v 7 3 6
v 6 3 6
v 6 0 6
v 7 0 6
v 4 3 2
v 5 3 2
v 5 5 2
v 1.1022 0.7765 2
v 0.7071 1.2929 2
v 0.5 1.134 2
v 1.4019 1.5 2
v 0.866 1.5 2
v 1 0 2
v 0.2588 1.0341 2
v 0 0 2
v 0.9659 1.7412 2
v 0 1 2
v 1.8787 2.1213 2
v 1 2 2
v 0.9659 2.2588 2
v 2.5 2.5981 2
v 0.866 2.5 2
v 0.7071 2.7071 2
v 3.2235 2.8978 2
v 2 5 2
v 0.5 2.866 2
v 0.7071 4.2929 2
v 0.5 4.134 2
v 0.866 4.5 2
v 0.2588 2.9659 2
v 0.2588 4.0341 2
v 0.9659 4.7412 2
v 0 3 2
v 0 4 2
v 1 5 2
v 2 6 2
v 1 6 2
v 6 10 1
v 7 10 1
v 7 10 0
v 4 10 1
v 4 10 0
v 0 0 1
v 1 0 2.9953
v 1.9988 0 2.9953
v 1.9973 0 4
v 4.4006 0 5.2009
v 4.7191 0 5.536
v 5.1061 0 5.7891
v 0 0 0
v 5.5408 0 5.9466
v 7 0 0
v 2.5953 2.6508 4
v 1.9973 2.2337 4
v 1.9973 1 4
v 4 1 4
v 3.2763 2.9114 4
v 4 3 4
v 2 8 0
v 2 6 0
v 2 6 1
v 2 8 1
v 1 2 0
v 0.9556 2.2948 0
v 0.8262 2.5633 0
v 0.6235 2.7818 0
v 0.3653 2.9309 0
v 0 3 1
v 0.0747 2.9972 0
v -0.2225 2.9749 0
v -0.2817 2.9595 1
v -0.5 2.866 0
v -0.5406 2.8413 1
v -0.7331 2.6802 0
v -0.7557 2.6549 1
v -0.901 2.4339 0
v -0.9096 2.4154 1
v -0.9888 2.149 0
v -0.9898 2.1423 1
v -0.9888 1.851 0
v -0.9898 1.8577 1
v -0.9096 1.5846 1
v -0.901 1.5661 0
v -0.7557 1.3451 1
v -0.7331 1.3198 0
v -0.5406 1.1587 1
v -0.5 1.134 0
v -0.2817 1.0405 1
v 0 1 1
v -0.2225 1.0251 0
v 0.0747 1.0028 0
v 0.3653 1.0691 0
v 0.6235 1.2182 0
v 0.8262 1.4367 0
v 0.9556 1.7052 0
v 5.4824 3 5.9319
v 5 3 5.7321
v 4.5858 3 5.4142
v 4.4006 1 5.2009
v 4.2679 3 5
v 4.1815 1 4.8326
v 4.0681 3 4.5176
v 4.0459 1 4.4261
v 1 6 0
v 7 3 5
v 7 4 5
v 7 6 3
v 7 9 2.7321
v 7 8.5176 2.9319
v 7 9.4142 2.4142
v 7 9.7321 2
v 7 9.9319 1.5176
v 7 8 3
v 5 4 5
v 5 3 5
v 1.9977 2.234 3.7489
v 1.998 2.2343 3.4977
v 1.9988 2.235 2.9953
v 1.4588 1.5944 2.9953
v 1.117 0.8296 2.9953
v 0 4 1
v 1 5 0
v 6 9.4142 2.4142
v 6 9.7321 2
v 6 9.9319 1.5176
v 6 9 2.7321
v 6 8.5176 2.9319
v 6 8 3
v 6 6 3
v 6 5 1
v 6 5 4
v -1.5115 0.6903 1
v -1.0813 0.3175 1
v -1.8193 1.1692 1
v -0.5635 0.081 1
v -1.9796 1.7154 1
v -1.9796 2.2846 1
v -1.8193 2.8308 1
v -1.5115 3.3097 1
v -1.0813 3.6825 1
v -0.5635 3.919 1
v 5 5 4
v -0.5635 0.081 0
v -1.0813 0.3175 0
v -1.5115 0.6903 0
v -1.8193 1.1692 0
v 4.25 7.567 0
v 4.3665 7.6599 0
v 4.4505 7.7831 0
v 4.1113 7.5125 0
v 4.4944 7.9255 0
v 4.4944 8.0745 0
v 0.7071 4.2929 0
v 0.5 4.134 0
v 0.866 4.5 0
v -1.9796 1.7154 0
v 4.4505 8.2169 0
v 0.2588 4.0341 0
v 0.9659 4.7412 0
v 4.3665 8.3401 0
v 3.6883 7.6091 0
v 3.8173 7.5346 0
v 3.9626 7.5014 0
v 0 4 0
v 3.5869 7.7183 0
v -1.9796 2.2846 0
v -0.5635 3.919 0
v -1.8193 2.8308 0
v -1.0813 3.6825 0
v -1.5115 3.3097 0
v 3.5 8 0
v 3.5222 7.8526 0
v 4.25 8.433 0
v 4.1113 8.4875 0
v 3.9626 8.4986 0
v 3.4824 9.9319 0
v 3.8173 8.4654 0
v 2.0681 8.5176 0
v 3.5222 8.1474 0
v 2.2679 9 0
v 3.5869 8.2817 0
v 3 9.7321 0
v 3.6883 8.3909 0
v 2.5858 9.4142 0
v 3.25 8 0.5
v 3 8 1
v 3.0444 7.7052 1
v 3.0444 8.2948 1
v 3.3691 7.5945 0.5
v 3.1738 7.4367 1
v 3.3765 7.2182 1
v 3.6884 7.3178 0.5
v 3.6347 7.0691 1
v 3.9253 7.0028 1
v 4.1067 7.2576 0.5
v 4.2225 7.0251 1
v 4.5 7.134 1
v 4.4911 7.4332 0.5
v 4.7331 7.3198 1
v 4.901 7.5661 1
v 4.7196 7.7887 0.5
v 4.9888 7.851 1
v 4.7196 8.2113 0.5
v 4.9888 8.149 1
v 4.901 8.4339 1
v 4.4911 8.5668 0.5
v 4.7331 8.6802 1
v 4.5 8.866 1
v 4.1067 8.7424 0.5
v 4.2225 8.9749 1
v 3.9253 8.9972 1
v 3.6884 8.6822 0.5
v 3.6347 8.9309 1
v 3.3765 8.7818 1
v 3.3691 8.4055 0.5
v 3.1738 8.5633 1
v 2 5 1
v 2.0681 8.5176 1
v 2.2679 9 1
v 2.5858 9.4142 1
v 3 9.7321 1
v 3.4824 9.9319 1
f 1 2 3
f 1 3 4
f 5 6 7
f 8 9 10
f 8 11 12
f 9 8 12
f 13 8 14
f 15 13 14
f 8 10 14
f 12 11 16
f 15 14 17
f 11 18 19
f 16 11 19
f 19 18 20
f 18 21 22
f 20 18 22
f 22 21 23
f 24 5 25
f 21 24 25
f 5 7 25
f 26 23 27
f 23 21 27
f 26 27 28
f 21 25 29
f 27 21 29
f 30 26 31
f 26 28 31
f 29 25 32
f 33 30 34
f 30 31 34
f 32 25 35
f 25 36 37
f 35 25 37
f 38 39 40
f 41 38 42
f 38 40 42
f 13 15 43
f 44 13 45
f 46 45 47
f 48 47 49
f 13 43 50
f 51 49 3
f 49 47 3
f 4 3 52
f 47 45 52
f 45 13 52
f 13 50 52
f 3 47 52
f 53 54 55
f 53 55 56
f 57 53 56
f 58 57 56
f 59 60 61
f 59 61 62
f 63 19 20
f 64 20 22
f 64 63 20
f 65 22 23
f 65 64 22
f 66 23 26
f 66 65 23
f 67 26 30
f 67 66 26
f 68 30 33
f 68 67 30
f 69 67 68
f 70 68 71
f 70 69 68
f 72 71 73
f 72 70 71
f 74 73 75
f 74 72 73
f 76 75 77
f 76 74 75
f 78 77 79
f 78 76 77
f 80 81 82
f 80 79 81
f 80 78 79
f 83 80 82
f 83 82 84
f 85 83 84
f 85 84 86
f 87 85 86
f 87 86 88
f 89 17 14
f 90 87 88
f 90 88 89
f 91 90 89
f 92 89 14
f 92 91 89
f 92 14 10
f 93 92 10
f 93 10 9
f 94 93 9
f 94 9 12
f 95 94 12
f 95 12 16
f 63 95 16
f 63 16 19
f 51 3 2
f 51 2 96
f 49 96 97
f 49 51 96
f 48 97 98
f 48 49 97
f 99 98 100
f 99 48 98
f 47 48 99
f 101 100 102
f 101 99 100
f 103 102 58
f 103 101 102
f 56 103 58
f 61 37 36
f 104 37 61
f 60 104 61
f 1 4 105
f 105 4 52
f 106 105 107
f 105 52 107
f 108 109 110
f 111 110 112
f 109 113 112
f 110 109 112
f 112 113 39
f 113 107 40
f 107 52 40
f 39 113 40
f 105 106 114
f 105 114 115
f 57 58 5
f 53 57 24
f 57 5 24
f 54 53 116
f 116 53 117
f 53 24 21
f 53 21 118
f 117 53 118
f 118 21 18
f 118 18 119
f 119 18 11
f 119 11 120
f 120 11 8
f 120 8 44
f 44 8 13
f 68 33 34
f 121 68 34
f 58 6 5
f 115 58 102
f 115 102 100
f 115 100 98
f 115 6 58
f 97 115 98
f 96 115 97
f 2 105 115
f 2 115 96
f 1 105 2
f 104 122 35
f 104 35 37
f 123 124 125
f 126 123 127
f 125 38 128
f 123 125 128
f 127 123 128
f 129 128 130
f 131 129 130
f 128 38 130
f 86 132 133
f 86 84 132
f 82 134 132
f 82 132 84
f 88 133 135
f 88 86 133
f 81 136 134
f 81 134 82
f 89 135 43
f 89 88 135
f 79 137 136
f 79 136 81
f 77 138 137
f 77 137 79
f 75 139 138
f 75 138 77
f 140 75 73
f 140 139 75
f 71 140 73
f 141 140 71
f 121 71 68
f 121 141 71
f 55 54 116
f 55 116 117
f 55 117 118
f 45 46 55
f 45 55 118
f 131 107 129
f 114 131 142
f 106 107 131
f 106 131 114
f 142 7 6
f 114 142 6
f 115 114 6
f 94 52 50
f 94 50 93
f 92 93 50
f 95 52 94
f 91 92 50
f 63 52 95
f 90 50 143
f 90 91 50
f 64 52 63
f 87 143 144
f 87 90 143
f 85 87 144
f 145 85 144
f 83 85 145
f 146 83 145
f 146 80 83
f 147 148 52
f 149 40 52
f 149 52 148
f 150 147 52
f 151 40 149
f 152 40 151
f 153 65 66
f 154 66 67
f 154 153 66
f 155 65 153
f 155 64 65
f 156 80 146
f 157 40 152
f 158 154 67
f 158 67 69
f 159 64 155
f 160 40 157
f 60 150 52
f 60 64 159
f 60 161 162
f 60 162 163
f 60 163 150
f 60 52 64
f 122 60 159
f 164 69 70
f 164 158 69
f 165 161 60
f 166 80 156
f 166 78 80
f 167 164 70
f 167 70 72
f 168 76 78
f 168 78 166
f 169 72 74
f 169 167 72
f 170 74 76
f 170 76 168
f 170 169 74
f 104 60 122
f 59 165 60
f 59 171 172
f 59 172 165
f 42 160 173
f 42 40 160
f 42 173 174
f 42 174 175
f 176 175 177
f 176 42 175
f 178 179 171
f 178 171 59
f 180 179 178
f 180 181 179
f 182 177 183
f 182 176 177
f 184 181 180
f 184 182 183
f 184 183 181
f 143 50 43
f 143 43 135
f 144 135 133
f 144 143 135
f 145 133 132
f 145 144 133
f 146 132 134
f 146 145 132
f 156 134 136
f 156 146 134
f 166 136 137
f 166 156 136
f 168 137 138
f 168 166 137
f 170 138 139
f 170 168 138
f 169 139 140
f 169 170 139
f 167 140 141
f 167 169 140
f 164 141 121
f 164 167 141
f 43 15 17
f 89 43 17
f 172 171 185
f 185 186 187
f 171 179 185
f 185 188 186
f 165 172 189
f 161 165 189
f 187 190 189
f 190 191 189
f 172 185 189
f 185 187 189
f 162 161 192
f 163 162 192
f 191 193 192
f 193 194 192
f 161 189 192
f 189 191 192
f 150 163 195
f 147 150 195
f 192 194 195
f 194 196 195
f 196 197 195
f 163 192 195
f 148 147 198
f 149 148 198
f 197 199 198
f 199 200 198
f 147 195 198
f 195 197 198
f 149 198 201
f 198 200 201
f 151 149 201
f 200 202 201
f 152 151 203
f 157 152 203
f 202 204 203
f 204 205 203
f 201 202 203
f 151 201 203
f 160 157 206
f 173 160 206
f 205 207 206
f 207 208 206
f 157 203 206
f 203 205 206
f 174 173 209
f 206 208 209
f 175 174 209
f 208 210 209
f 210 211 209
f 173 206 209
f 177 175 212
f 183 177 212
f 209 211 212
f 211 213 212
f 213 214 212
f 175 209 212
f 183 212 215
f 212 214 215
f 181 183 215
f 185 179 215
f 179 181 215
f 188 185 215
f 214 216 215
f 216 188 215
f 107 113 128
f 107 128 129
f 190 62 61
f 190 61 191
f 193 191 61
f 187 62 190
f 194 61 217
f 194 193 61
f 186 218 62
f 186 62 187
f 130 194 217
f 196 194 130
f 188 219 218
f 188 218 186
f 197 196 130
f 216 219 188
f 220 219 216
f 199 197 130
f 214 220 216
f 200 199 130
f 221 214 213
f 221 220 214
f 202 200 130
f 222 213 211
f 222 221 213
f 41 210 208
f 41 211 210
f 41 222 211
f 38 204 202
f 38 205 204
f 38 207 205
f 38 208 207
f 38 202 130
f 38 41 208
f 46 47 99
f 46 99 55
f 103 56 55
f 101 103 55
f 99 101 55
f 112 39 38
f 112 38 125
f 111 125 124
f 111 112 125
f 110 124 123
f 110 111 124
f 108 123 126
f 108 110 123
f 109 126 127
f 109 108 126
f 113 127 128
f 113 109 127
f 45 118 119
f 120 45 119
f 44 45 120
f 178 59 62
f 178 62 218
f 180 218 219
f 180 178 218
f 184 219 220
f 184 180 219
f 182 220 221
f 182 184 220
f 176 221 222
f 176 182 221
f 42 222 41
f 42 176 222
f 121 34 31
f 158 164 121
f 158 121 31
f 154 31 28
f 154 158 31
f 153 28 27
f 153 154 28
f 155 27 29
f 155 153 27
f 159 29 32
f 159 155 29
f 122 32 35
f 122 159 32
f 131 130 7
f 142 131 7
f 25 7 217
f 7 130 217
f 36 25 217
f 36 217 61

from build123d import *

# Parameters (mm, degrees)
SKETCH1_R           = 1
BOSS_EXTRUDE1_DEPTH = 2
SKETCH2_W           = 4
SKETCH2_H           = 5
SKETCH2_W_2         = 2.463434366
SKETCH2_H_2         = 4
CUT_EXTRUDE1_DEPTH  = 1
BOSS_EXTRUDE2_DEPTH = 4
CUT_EXTRUDE2_DEPTH  = 4
CUT_EXTRUDE3_DEPTH  = 2
CUT_EXTRUDE4_START  = -3
CUT_EXTRUDE4_DEPTH  = 2.234970342


with BuildPart() as part:
    # Sketch1 → Boss-Extrude1 (new body)
    with BuildSketch(Plane.XY):
        with BuildLine():
            Line((1, 5), (1, 6))
            Line((1, 6), (2, 6))
            Line((2, 6), (2, 8))
            ThreePointArc((2, 8), (2.585786438, 9.414213562), (4, 10))
            Line((4, 10), (7, 10))
            Line((7, 10), (7, 0))
            Line((7, 0), (0, 0))
            ThreePointArc((0, 0), (-2, 2), (0, 4))
            ThreePointArc((0, 4), (0.707106781, 4.292893219), (1, 5))
        make_face()
        with Locations((0, 2)):
            Circle(SKETCH1_R, mode=Mode.SUBTRACT)
    extrude(amount=BOSS_EXTRUDE1_DEPTH)

    # Sketch2 → Cut-Extrude1 (cut)
    with BuildSketch(Plane.XY.offset(2)):
        with Locations((4, 7.5)):
            Rectangle(SKETCH2_W, SKETCH2_H)
        with Locations((-1.231717183, 2)):
            Rectangle(SKETCH2_W_2, SKETCH2_H_2)
    extrude(amount=-CUT_EXTRUDE1_DEPTH, mode=Mode.SUBTRACT)

    # Sketch3 → Boss-Extrude2 (add)
    with BuildSketch(Plane.XY.offset(2)):
        with BuildLine():
            Line((7, 10), (6, 10))
            Line((6, 10), (6, 5))
            Line((6, 5), (5, 5))
            Line((5, 5), (5, 3))
            Line((5, 3), (4, 3))
            ThreePointArc((4, 3), (1.878679656, 2.121320344), (1, 0))
            Line((1, 0), (7, 0))
            Line((7, 0), (7, 10))
        make_face()
    extrude(amount=BOSS_EXTRUDE2_DEPTH)

    # Sketch4 → Cut-Extrude2 (cut)
    with BuildSketch(Plane(origin=(7, 0, 0), x_dir=(0, 0, -1), z_dir=(1, 0, 0))):
        with BuildLine():
            Line((-3, 8), (-3, 6))
            Line((-3, 6), (-5, 4))
            Line((-5, 4), (-5, 3))
            Line((-5, 3), (-6, 3))
            Line((-6, 3), (-6, 10))
            Line((-6, 10), (-1, 10))
            ThreePointArc((-1, 10), (-2.414213562, 9.414213562), (-3, 8))
        make_face()
    extrude(amount=-CUT_EXTRUDE2_DEPTH, mode=Mode.SUBTRACT)

    # Sketch5 → Cut-Extrude3 (cut)
    with BuildSketch(Plane(origin=(0, 3, 0), x_dir=(1, 0, 0), z_dir=(0, 1, 0))):
        with BuildLine():
            Line((6, -6), (1.997304718, -6))
            Line((1.997304718, -6), (1.997304718, -4))
            Line((1.997304718, -4), (4, -4))
            ThreePointArc((4, -4), (4.585786438, -5.414213562), (6, -6))
        make_face()
    extrude(amount=-CUT_EXTRUDE3_DEPTH, mode=Mode.SUBTRACT)

    # Cut-Extrude4: read off the stored shape, not the designer's step
    # Cut-Extrude4 outline → Cut-Extrude4 (cut)
    with BuildSketch(Plane(origin=(0, 3, 0), x_dir=(1, 0, 0), z_dir=(0, 1, 0)).offset(CUT_EXTRUDE4_START)):
        with BuildLine():
            Line((1.998773483, -2.995283948), (1, -2.995283948))
            Line((1, -2.995283948), (1, -6))
            Line((1, -6), (6, -6))
            ThreePointArc((6, -6), (5.106054728, -5.78909526), (4.400646751, -5.200861851))
            Line((4.400646751, -5.200861851), (1.997304718, -4))
            Line((1.997304718, -4), (1.998773483, -2.995283948))
        make_face()
    extrude(amount=CUT_EXTRUDE4_DEPTH, mode=Mode.SUBTRACT)

    # Sketch8 → Cut-Revolve1 (revolve, cut)
    with BuildSketch(Plane(origin=(4, 0, 0), x_dir=(0, 0, -1), z_dir=(1, 0, 0)), mode=Mode.PRIVATE) as cut_revolve1_sk:
        Polygon((0, 8), (0, 8.5), (-1, 9), (-1, 8), align=None)
    revolve(cut_revolve1_sk.sketch.rotate(Axis((4, 8, -0.711012061), (0, 0, 1)), 90), axis=Axis((4, 8, -0.711012061), (0, 0, 1)), mode=Mode.SUBTRACT)


solid = part.part
